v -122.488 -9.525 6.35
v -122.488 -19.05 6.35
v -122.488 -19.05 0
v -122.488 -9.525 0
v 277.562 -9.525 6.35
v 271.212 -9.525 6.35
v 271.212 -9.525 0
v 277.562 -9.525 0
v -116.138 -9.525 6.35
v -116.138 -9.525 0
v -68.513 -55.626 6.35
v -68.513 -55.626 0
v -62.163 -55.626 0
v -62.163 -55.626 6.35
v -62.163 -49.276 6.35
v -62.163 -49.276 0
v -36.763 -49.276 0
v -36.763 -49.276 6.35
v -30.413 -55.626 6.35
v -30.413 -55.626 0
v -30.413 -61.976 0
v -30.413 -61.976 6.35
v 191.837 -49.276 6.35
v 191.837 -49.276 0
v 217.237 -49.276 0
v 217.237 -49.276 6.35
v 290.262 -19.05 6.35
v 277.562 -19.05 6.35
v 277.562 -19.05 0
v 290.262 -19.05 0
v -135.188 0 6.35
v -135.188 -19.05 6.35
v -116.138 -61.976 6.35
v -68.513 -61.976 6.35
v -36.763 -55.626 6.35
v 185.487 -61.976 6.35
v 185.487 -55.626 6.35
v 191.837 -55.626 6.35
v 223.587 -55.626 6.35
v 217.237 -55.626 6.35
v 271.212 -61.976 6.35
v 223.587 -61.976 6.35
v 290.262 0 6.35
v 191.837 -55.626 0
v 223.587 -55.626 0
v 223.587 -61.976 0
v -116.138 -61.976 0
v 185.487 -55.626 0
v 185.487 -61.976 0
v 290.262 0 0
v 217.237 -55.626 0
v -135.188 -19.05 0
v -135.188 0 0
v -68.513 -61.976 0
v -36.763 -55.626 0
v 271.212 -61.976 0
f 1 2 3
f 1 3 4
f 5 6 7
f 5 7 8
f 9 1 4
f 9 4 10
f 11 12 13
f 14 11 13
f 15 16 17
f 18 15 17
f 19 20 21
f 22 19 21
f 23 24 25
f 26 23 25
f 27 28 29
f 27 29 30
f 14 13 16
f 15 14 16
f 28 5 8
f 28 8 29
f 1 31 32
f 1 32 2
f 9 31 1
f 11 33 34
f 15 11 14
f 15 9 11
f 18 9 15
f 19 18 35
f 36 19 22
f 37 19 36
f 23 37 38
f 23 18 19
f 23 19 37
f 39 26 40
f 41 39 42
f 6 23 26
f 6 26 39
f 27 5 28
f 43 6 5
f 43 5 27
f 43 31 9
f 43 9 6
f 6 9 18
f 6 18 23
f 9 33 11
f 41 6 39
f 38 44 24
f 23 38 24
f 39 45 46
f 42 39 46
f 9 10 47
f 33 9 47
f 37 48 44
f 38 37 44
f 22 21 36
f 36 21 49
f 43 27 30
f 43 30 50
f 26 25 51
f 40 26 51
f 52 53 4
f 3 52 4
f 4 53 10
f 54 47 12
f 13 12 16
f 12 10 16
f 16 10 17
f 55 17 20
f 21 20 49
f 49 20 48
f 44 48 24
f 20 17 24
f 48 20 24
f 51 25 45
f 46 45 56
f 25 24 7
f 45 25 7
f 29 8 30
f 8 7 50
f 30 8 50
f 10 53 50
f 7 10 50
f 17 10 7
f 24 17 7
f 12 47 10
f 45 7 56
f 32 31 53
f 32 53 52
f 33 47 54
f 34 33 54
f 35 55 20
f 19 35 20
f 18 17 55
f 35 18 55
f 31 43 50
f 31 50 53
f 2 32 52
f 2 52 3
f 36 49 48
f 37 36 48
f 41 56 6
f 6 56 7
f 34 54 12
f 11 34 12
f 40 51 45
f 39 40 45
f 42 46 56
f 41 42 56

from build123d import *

# Parameters (mm, degrees)
F1_DEPTH = 6.35
F3_DEPTH = 6.35


with BuildPart() as f1:
    # F0 (on Top) → F1 (new body)
    with BuildSketch(Plane.XY):
        Polygon((-116.137687, 0), (-116.137687, -61.976), (-68.512687, -61.976), (-68.512687, -55.626), (-62.162687, -55.626), (-62.162687, -49.276), (-36.762687, -49.276), (-36.762687, -55.626), (-30.412687, -55.626), (-30.412687, -61.976), (185.487313, -61.976), (185.487313, -55.626), (191.837313, -55.626), (191.837313, -49.276), (217.237313, -49.276), (217.237313, -55.626), (223.587313, -55.626), (223.587313, -61.976), (271.212313, -61.976), (271.212313, 0), align=None)
    extrude(amount=F1_DEPTH)

    # F2 (on face) → F3 (join)
    with BuildSketch(Plane.XY.offset(6.35)):
        Polygon((290.262313, 0), (271.212313, 0), (271.212313, -9.525), (277.562313, -9.525), (277.562313, -19.05), (290.262313, -19.05), align=None)
        Polygon((-116.137687, -9.525), (-116.137687, 0), (-135.187687, 0), (-135.187687, -19.05), (-122.487687, -19.05), (-122.487687, -9.525), align=None)
    extrude(amount=-F3_DEPTH)


solid = f1.part
